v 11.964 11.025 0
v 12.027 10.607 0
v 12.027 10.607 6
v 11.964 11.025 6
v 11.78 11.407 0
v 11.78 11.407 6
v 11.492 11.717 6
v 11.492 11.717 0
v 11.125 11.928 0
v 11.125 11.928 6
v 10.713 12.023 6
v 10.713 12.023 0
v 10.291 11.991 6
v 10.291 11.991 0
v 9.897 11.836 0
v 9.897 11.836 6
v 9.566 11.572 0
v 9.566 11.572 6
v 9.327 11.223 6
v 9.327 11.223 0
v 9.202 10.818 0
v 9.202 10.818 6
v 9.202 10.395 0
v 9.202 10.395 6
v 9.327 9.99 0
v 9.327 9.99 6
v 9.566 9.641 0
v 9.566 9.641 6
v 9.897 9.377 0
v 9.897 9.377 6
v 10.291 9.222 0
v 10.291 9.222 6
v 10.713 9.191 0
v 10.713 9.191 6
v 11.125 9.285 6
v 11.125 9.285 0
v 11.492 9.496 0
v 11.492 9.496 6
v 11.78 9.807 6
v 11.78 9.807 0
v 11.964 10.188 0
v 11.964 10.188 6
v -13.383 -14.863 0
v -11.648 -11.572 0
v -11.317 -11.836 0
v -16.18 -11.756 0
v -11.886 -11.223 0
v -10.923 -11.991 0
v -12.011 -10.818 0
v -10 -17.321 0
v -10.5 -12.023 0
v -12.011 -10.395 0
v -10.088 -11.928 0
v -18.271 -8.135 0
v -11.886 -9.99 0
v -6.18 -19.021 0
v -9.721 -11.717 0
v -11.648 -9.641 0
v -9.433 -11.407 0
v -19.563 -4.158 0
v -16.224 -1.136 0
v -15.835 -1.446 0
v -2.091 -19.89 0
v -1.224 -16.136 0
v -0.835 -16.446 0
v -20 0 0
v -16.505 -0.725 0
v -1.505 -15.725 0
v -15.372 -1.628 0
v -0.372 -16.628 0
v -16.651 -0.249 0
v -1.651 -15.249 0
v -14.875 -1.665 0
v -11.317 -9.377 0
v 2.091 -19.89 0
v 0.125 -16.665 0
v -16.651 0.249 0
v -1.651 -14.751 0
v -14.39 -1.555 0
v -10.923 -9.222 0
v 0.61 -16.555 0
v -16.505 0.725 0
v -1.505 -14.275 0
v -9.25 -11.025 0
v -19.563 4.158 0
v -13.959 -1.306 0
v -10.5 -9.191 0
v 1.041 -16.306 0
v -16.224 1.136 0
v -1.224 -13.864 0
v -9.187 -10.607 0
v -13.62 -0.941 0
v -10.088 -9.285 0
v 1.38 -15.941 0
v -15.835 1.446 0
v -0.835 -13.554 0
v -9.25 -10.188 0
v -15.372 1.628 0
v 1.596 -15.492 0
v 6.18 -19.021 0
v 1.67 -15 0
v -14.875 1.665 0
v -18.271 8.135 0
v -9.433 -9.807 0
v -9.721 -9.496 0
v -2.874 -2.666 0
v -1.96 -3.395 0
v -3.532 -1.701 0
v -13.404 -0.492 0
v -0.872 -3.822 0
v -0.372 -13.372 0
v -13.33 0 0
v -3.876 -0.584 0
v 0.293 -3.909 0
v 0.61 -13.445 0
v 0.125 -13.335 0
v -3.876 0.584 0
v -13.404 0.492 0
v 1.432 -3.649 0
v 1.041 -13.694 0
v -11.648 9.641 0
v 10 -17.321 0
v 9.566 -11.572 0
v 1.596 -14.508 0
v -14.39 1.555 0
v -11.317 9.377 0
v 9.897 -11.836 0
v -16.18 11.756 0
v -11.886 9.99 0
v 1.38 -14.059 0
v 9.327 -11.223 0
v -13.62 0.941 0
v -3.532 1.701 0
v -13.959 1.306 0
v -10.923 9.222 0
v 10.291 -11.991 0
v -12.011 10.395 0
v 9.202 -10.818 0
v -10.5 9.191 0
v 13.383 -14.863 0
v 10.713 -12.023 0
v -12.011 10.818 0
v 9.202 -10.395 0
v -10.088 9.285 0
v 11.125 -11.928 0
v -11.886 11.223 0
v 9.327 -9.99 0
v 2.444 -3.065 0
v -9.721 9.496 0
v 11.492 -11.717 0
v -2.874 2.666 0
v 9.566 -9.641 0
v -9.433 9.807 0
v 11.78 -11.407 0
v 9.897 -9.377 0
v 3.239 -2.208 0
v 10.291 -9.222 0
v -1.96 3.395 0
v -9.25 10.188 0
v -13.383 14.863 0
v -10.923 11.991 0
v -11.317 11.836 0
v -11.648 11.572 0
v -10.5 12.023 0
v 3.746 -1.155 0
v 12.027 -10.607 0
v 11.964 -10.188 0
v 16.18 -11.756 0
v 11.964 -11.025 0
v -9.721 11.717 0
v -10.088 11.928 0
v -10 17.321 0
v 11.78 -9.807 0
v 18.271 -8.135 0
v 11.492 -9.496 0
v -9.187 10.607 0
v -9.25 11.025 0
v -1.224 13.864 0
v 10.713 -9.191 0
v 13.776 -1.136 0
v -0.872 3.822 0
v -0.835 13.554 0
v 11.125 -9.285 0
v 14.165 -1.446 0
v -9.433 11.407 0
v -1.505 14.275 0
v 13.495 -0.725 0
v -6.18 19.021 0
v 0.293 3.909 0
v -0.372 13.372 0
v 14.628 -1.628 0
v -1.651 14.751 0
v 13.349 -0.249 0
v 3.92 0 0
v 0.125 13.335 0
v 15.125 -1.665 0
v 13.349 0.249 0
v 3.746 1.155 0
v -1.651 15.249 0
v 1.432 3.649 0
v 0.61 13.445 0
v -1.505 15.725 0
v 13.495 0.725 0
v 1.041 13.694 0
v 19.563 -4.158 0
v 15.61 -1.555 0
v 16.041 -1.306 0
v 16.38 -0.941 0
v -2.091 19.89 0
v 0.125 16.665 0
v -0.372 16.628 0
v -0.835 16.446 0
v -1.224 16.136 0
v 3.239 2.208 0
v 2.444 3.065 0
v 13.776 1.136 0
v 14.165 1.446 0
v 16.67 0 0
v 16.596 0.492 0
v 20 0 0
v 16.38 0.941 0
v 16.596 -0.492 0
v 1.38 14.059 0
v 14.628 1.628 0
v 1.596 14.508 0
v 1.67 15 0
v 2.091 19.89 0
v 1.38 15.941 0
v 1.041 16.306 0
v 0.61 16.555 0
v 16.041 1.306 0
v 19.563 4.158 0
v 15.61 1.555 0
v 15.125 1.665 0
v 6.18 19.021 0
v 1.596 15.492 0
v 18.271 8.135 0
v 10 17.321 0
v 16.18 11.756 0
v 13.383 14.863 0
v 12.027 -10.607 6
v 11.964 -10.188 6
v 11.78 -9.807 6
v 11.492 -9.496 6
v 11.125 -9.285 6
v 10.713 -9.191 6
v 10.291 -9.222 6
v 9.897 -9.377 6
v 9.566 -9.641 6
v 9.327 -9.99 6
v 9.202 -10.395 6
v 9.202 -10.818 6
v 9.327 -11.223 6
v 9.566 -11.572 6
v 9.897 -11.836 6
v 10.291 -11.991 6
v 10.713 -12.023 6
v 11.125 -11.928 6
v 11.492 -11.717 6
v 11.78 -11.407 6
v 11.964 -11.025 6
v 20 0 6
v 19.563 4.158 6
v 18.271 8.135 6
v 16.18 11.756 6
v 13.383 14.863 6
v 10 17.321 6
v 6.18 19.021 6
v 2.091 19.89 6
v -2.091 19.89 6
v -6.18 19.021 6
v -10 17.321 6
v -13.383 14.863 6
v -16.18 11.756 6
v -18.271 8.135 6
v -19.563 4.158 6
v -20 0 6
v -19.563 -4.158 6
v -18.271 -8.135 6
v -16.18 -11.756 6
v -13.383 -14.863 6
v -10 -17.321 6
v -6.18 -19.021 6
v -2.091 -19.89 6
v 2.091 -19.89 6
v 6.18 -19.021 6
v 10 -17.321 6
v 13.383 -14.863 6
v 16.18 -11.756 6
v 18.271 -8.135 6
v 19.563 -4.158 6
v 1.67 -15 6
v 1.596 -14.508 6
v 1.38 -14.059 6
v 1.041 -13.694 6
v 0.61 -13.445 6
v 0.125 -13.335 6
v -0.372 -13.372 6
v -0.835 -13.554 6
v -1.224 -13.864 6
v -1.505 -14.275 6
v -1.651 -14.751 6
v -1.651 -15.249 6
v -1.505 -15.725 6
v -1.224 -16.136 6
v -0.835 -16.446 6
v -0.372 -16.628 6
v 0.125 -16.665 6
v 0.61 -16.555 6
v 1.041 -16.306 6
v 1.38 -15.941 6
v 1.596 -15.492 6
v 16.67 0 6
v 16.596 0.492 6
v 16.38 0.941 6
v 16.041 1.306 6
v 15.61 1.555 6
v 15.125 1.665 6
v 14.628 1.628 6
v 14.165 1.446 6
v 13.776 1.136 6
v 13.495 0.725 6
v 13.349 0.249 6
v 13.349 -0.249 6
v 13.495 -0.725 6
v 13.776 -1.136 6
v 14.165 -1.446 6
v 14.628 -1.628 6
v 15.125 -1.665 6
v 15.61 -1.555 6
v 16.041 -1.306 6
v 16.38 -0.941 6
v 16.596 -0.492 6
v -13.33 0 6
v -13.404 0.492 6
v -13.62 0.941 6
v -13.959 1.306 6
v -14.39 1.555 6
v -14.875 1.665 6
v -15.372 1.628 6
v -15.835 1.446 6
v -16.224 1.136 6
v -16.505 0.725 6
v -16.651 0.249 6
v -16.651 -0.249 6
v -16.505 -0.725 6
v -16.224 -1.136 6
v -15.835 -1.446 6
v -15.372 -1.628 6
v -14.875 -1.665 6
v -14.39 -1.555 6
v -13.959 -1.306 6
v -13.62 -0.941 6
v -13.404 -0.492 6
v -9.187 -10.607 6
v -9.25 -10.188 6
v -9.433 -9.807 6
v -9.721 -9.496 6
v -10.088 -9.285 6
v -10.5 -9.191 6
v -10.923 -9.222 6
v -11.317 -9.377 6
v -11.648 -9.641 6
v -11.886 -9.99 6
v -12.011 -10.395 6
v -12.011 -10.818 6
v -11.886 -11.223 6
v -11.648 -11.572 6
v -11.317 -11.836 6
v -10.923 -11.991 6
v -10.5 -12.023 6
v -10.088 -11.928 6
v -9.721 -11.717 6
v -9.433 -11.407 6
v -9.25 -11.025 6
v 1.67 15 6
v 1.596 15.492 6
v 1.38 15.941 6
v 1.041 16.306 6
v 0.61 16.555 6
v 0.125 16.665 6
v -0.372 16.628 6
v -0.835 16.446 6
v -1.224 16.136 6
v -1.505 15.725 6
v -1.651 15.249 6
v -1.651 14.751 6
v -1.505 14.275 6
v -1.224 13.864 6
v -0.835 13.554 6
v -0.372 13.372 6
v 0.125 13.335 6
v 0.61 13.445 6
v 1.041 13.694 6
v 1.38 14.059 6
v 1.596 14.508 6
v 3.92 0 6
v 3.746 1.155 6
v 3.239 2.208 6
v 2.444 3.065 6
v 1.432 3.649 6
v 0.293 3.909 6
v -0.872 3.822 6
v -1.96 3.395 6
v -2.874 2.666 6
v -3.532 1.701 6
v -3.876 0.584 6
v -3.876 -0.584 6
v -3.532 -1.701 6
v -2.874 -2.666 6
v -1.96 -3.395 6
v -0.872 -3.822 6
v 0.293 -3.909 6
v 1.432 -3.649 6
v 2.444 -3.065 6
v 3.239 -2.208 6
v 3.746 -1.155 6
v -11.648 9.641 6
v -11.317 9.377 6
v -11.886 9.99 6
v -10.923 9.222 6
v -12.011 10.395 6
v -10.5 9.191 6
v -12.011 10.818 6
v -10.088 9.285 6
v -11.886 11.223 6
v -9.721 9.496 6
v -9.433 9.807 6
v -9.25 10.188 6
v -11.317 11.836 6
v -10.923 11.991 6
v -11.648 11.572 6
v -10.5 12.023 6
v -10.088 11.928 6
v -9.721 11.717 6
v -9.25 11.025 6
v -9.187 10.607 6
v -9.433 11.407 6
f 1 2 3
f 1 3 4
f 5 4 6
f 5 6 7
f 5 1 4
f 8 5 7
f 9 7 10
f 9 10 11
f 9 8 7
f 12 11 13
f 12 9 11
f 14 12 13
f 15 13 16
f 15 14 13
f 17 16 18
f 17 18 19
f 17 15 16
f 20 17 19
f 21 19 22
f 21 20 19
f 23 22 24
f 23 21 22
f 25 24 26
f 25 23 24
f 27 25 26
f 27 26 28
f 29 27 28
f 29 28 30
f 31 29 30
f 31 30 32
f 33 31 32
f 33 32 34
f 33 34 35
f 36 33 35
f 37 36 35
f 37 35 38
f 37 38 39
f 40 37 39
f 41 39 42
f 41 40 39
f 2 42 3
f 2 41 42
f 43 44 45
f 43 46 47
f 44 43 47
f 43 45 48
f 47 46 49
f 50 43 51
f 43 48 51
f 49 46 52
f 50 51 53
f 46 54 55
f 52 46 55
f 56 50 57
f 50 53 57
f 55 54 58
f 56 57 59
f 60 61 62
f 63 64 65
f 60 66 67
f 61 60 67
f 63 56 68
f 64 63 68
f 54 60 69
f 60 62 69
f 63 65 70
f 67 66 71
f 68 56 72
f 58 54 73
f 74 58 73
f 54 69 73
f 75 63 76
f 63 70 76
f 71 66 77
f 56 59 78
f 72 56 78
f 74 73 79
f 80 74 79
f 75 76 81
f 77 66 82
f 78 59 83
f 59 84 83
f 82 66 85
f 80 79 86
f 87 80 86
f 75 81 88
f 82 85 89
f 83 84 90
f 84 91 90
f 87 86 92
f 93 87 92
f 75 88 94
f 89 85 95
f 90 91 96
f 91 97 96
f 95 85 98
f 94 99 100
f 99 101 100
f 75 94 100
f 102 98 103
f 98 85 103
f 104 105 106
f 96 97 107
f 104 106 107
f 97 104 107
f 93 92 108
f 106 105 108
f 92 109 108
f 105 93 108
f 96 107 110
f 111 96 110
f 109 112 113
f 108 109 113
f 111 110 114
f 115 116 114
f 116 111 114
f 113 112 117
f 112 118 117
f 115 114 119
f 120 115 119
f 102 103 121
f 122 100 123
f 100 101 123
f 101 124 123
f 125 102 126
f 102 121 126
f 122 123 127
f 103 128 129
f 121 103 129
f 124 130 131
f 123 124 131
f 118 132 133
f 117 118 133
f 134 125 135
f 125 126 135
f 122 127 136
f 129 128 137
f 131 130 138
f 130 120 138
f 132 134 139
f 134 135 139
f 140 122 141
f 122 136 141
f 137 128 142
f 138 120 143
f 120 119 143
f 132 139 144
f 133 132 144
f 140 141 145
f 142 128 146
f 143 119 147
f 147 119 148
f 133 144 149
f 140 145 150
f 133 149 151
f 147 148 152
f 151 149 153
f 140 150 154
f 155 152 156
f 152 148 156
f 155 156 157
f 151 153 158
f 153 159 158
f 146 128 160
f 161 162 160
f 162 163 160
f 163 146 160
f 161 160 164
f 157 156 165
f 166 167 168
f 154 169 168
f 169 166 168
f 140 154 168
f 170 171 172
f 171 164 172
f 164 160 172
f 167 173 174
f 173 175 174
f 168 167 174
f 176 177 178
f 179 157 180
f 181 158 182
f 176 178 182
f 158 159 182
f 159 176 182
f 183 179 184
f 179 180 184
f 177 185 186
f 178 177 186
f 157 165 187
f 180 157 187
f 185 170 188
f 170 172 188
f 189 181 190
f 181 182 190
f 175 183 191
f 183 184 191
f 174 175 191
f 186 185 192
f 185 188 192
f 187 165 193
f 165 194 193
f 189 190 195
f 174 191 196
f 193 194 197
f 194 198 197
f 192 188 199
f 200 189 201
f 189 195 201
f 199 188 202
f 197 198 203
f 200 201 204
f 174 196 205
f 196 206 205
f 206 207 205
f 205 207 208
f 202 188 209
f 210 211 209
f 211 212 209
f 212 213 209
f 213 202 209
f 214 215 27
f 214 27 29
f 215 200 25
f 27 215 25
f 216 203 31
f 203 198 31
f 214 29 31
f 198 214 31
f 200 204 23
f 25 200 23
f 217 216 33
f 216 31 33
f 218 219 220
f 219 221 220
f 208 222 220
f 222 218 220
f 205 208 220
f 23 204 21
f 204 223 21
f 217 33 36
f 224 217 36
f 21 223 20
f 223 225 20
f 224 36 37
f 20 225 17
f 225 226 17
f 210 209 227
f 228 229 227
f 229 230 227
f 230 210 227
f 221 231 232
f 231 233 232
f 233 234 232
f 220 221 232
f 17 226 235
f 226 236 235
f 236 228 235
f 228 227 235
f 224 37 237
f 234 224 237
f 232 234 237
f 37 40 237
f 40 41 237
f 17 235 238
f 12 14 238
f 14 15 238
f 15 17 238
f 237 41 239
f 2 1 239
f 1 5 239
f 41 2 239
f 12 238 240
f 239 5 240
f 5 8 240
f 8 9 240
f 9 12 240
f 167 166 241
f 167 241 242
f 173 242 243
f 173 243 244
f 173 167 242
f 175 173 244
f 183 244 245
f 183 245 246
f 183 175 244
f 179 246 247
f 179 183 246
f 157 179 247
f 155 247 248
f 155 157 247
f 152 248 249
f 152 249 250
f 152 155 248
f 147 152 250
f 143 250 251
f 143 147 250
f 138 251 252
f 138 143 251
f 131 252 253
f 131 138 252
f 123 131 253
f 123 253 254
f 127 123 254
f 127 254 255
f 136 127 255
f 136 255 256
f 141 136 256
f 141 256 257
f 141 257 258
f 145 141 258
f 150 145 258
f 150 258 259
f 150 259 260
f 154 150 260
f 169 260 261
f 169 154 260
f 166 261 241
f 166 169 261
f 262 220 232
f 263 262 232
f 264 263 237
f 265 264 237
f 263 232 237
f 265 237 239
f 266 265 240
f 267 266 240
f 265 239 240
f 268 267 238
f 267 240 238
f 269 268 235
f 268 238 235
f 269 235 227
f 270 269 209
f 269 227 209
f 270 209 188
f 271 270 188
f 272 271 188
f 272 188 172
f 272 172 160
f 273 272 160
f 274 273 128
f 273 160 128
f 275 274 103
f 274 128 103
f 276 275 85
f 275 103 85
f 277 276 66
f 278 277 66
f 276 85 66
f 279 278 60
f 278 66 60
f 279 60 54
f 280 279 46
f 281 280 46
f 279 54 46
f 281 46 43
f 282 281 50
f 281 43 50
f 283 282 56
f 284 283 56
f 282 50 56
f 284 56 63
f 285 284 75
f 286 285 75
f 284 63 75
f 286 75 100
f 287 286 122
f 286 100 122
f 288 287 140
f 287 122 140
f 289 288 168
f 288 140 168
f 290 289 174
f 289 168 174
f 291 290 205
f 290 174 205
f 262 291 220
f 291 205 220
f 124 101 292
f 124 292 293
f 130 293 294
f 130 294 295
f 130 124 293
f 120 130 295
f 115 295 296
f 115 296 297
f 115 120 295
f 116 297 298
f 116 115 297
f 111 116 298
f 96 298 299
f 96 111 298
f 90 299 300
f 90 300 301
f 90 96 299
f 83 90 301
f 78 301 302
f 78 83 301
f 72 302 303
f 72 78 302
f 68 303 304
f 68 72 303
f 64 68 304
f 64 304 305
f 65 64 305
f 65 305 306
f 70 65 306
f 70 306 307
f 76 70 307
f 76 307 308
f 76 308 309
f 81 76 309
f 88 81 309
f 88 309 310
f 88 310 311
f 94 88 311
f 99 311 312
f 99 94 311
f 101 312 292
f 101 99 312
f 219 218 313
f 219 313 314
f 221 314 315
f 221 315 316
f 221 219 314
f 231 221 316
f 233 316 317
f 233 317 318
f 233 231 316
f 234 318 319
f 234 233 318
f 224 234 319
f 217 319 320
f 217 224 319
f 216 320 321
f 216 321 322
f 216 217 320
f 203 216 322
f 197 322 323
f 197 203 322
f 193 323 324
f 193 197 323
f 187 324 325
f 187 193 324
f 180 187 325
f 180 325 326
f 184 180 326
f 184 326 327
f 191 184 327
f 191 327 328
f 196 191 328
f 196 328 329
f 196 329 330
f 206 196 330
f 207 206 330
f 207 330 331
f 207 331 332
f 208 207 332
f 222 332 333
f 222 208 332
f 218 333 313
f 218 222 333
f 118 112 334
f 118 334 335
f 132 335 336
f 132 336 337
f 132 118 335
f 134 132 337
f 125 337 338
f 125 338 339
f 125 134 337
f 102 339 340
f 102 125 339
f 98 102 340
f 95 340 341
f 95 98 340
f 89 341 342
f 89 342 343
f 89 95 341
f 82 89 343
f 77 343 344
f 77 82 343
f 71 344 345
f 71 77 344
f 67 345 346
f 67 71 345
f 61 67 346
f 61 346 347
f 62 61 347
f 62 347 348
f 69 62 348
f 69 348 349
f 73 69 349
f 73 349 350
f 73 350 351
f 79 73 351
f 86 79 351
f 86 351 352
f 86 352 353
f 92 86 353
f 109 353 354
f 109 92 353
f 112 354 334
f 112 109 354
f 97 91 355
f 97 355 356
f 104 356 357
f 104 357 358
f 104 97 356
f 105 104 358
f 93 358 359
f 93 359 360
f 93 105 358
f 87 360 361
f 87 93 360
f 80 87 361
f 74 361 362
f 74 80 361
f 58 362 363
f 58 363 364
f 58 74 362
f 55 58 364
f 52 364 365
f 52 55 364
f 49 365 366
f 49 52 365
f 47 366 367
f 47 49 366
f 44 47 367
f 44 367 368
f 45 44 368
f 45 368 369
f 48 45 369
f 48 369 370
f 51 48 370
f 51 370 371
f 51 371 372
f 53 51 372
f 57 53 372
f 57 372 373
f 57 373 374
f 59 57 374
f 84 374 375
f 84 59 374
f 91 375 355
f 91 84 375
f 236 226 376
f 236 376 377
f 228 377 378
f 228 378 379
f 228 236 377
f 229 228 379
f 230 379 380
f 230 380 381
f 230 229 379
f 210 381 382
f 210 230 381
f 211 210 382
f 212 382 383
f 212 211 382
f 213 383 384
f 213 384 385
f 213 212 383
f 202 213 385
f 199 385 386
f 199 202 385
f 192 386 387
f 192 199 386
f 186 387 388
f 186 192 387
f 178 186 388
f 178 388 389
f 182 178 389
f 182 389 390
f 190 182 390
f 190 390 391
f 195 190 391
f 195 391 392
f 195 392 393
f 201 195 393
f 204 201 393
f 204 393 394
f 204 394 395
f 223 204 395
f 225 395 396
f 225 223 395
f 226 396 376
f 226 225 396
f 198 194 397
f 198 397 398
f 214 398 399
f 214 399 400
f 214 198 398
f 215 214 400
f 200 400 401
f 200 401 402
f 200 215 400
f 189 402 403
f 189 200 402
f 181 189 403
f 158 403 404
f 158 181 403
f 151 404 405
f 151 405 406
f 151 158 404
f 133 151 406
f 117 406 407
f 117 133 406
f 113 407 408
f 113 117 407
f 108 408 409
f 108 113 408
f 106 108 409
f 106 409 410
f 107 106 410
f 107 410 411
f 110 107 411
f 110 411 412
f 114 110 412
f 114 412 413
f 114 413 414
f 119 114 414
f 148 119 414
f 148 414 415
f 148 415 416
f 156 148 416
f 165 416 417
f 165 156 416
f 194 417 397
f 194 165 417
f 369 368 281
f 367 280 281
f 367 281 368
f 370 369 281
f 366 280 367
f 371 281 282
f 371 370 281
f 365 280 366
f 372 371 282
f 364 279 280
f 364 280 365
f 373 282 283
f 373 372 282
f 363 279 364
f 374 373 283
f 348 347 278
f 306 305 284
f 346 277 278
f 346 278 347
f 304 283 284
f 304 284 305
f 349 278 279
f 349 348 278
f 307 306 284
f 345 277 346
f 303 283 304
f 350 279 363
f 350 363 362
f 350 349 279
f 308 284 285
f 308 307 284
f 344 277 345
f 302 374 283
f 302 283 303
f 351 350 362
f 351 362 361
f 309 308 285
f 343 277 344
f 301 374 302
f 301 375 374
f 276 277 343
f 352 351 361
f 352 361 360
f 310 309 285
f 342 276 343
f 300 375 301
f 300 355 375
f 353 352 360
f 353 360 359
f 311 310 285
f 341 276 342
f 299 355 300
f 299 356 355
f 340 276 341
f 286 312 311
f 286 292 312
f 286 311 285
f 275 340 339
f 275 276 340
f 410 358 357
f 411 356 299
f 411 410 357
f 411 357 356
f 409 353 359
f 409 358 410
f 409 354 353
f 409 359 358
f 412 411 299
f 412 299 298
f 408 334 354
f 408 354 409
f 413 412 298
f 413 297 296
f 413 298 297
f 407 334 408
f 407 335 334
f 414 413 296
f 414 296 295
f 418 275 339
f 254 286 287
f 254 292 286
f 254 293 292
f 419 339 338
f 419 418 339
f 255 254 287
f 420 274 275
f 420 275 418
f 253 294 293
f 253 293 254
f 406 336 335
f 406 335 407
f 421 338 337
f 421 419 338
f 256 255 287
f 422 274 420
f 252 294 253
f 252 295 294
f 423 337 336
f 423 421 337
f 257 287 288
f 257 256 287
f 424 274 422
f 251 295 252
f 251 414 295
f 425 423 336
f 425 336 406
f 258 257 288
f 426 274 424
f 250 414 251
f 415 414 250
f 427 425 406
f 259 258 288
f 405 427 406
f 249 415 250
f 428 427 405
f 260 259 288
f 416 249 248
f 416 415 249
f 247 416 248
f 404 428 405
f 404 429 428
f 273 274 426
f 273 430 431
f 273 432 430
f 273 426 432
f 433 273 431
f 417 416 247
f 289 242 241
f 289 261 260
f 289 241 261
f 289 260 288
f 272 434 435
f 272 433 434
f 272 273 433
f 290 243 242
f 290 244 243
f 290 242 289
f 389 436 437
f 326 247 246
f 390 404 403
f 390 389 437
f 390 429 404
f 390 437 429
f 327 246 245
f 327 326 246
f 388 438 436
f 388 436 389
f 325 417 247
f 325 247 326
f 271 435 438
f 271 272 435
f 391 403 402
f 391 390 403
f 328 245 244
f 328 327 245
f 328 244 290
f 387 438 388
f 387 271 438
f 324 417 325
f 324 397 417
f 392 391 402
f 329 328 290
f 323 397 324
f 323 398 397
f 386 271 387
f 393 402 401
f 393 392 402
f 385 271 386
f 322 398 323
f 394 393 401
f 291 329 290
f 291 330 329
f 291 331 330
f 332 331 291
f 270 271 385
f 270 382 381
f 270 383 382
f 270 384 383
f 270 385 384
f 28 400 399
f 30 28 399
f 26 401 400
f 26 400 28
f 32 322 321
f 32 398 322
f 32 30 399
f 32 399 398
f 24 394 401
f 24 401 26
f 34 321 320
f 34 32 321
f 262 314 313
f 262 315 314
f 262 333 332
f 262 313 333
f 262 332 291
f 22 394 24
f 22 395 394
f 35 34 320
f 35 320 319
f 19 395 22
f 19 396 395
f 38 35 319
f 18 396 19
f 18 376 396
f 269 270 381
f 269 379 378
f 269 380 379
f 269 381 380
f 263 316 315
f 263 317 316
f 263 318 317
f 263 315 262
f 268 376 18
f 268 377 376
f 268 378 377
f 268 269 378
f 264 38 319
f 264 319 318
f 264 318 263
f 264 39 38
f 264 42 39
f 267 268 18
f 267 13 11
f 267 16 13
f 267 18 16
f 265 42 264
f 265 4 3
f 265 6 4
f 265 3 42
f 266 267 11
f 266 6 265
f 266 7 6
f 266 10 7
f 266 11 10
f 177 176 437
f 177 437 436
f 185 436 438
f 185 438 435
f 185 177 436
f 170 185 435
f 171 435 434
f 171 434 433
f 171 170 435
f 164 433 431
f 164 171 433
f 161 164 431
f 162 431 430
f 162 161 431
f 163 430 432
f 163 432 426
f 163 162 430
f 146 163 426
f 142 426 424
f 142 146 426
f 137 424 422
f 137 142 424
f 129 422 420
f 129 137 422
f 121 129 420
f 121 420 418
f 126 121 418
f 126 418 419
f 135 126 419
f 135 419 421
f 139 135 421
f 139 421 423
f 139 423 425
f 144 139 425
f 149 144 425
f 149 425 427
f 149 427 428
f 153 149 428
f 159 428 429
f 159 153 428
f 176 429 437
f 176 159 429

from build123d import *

# Parameters (mm, degrees)
SKETCH1_R           = 20
SKETCH1_R_2         = 4
SKETCH1_R_3         = 1.75
SKETCH1_R_4         = 1.5
BOSS_EXTRUDE1_DEPTH = 6
MOVE_FACE2_BY       = 0.08
MOVE_FACE2_2_BY     = 0.08
MOVE_FACE2_3_BY     = 0.08
MOVE_FACE2_4_BY     = 0.08
MOVE_FACE2_5_BY     = 0.08
MOVE_FACE2_6_BY     = 0.08
MOVE_FACE2_7_BY     = 0.08
MOVE_FACE2_8_BY     = 0.08
MOVE_FACE2_9_BY     = 0.08


with BuildPart() as part:
    # Sketch1 → Boss-Extrude1 (new body)
    with BuildSketch(Plane.XY):
        Circle(SKETCH1_R)
        Circle(SKETCH1_R_2, mode=Mode.SUBTRACT)
        with Locations((0, 15)):
            Circle(SKETCH1_R_3, mode=Mode.SUBTRACT)
        with Locations((10.606601718, 10.606601718)):
            Circle(SKETCH1_R_4, mode=Mode.SUBTRACT)
        with Locations((15, 0)):
            Circle(SKETCH1_R_3, mode=Mode.SUBTRACT)
        with Locations((10.606601718, -10.606601718)):
            Circle(SKETCH1_R_4, mode=Mode.SUBTRACT)
        with Locations((0, -15)):
            Circle(SKETCH1_R_3, mode=Mode.SUBTRACT)
        with Locations((-10.606601718, -10.606601718)):
            Circle(SKETCH1_R_4, mode=Mode.SUBTRACT)
        with Locations((-15, 0)):
            Circle(SKETCH1_R_3, mode=Mode.SUBTRACT)
        with Locations((-10.606601718, 10.606601718)):
            Circle(SKETCH1_R_4, mode=Mode.SUBTRACT)
    extrude(amount=BOSS_EXTRUDE1_DEPTH)

    # Move Face2: a curved face moved outward by 0.08
    add(Solid.thicken(part.faces().sort_by_distance((-4, 0, 3))[0], MOVE_FACE2_BY))

    # Move Face2 2: a curved face moved outward by 0.08
    add(Solid.thicken(part.faces().sort_by_distance((-1.75, 15, 3))[0], MOVE_FACE2_2_BY))

    # Move Face2 3: a curved face moved outward by 0.08
    add(Solid.thicken(part.faces().sort_by_distance((9.106601718, 10.606601718, 3))[0], MOVE_FACE2_3_BY))

    # Move Face2 4: a curved face moved outward by 0.08
    add(Solid.thicken(part.faces().sort_by_distance((13.25, 0, 3))[0], MOVE_FACE2_4_BY))

    # Move Face2 5: a curved face moved outward by 0.08
    add(Solid.thicken(part.faces().sort_by_distance((9.106601718, -10.606601718, 3))[0], MOVE_FACE2_5_BY))

    # Move Face2 6: a curved face moved outward by 0.08
    add(Solid.thicken(part.faces().sort_by_distance((-1.75, -15, 3))[0], MOVE_FACE2_6_BY))

    # Move Face2 7: a curved face moved outward by 0.08
    add(Solid.thicken(part.faces().sort_by_distance((-12.106601718, -10.606601718, 3))[0], MOVE_FACE2_7_BY))

    # Move Face2 8: a curved face moved outward by 0.08
    add(Solid.thicken(part.faces().sort_by_distance((-16.75, 0, 3))[0], MOVE_FACE2_8_BY))

    # Move Face2 9: a curved face moved outward by 0.08
    add(Solid.thicken(part.faces().sort_by_distance((-12.106601718, 10.606601718, 3))[0], MOVE_FACE2_9_BY))


solid = part.part
